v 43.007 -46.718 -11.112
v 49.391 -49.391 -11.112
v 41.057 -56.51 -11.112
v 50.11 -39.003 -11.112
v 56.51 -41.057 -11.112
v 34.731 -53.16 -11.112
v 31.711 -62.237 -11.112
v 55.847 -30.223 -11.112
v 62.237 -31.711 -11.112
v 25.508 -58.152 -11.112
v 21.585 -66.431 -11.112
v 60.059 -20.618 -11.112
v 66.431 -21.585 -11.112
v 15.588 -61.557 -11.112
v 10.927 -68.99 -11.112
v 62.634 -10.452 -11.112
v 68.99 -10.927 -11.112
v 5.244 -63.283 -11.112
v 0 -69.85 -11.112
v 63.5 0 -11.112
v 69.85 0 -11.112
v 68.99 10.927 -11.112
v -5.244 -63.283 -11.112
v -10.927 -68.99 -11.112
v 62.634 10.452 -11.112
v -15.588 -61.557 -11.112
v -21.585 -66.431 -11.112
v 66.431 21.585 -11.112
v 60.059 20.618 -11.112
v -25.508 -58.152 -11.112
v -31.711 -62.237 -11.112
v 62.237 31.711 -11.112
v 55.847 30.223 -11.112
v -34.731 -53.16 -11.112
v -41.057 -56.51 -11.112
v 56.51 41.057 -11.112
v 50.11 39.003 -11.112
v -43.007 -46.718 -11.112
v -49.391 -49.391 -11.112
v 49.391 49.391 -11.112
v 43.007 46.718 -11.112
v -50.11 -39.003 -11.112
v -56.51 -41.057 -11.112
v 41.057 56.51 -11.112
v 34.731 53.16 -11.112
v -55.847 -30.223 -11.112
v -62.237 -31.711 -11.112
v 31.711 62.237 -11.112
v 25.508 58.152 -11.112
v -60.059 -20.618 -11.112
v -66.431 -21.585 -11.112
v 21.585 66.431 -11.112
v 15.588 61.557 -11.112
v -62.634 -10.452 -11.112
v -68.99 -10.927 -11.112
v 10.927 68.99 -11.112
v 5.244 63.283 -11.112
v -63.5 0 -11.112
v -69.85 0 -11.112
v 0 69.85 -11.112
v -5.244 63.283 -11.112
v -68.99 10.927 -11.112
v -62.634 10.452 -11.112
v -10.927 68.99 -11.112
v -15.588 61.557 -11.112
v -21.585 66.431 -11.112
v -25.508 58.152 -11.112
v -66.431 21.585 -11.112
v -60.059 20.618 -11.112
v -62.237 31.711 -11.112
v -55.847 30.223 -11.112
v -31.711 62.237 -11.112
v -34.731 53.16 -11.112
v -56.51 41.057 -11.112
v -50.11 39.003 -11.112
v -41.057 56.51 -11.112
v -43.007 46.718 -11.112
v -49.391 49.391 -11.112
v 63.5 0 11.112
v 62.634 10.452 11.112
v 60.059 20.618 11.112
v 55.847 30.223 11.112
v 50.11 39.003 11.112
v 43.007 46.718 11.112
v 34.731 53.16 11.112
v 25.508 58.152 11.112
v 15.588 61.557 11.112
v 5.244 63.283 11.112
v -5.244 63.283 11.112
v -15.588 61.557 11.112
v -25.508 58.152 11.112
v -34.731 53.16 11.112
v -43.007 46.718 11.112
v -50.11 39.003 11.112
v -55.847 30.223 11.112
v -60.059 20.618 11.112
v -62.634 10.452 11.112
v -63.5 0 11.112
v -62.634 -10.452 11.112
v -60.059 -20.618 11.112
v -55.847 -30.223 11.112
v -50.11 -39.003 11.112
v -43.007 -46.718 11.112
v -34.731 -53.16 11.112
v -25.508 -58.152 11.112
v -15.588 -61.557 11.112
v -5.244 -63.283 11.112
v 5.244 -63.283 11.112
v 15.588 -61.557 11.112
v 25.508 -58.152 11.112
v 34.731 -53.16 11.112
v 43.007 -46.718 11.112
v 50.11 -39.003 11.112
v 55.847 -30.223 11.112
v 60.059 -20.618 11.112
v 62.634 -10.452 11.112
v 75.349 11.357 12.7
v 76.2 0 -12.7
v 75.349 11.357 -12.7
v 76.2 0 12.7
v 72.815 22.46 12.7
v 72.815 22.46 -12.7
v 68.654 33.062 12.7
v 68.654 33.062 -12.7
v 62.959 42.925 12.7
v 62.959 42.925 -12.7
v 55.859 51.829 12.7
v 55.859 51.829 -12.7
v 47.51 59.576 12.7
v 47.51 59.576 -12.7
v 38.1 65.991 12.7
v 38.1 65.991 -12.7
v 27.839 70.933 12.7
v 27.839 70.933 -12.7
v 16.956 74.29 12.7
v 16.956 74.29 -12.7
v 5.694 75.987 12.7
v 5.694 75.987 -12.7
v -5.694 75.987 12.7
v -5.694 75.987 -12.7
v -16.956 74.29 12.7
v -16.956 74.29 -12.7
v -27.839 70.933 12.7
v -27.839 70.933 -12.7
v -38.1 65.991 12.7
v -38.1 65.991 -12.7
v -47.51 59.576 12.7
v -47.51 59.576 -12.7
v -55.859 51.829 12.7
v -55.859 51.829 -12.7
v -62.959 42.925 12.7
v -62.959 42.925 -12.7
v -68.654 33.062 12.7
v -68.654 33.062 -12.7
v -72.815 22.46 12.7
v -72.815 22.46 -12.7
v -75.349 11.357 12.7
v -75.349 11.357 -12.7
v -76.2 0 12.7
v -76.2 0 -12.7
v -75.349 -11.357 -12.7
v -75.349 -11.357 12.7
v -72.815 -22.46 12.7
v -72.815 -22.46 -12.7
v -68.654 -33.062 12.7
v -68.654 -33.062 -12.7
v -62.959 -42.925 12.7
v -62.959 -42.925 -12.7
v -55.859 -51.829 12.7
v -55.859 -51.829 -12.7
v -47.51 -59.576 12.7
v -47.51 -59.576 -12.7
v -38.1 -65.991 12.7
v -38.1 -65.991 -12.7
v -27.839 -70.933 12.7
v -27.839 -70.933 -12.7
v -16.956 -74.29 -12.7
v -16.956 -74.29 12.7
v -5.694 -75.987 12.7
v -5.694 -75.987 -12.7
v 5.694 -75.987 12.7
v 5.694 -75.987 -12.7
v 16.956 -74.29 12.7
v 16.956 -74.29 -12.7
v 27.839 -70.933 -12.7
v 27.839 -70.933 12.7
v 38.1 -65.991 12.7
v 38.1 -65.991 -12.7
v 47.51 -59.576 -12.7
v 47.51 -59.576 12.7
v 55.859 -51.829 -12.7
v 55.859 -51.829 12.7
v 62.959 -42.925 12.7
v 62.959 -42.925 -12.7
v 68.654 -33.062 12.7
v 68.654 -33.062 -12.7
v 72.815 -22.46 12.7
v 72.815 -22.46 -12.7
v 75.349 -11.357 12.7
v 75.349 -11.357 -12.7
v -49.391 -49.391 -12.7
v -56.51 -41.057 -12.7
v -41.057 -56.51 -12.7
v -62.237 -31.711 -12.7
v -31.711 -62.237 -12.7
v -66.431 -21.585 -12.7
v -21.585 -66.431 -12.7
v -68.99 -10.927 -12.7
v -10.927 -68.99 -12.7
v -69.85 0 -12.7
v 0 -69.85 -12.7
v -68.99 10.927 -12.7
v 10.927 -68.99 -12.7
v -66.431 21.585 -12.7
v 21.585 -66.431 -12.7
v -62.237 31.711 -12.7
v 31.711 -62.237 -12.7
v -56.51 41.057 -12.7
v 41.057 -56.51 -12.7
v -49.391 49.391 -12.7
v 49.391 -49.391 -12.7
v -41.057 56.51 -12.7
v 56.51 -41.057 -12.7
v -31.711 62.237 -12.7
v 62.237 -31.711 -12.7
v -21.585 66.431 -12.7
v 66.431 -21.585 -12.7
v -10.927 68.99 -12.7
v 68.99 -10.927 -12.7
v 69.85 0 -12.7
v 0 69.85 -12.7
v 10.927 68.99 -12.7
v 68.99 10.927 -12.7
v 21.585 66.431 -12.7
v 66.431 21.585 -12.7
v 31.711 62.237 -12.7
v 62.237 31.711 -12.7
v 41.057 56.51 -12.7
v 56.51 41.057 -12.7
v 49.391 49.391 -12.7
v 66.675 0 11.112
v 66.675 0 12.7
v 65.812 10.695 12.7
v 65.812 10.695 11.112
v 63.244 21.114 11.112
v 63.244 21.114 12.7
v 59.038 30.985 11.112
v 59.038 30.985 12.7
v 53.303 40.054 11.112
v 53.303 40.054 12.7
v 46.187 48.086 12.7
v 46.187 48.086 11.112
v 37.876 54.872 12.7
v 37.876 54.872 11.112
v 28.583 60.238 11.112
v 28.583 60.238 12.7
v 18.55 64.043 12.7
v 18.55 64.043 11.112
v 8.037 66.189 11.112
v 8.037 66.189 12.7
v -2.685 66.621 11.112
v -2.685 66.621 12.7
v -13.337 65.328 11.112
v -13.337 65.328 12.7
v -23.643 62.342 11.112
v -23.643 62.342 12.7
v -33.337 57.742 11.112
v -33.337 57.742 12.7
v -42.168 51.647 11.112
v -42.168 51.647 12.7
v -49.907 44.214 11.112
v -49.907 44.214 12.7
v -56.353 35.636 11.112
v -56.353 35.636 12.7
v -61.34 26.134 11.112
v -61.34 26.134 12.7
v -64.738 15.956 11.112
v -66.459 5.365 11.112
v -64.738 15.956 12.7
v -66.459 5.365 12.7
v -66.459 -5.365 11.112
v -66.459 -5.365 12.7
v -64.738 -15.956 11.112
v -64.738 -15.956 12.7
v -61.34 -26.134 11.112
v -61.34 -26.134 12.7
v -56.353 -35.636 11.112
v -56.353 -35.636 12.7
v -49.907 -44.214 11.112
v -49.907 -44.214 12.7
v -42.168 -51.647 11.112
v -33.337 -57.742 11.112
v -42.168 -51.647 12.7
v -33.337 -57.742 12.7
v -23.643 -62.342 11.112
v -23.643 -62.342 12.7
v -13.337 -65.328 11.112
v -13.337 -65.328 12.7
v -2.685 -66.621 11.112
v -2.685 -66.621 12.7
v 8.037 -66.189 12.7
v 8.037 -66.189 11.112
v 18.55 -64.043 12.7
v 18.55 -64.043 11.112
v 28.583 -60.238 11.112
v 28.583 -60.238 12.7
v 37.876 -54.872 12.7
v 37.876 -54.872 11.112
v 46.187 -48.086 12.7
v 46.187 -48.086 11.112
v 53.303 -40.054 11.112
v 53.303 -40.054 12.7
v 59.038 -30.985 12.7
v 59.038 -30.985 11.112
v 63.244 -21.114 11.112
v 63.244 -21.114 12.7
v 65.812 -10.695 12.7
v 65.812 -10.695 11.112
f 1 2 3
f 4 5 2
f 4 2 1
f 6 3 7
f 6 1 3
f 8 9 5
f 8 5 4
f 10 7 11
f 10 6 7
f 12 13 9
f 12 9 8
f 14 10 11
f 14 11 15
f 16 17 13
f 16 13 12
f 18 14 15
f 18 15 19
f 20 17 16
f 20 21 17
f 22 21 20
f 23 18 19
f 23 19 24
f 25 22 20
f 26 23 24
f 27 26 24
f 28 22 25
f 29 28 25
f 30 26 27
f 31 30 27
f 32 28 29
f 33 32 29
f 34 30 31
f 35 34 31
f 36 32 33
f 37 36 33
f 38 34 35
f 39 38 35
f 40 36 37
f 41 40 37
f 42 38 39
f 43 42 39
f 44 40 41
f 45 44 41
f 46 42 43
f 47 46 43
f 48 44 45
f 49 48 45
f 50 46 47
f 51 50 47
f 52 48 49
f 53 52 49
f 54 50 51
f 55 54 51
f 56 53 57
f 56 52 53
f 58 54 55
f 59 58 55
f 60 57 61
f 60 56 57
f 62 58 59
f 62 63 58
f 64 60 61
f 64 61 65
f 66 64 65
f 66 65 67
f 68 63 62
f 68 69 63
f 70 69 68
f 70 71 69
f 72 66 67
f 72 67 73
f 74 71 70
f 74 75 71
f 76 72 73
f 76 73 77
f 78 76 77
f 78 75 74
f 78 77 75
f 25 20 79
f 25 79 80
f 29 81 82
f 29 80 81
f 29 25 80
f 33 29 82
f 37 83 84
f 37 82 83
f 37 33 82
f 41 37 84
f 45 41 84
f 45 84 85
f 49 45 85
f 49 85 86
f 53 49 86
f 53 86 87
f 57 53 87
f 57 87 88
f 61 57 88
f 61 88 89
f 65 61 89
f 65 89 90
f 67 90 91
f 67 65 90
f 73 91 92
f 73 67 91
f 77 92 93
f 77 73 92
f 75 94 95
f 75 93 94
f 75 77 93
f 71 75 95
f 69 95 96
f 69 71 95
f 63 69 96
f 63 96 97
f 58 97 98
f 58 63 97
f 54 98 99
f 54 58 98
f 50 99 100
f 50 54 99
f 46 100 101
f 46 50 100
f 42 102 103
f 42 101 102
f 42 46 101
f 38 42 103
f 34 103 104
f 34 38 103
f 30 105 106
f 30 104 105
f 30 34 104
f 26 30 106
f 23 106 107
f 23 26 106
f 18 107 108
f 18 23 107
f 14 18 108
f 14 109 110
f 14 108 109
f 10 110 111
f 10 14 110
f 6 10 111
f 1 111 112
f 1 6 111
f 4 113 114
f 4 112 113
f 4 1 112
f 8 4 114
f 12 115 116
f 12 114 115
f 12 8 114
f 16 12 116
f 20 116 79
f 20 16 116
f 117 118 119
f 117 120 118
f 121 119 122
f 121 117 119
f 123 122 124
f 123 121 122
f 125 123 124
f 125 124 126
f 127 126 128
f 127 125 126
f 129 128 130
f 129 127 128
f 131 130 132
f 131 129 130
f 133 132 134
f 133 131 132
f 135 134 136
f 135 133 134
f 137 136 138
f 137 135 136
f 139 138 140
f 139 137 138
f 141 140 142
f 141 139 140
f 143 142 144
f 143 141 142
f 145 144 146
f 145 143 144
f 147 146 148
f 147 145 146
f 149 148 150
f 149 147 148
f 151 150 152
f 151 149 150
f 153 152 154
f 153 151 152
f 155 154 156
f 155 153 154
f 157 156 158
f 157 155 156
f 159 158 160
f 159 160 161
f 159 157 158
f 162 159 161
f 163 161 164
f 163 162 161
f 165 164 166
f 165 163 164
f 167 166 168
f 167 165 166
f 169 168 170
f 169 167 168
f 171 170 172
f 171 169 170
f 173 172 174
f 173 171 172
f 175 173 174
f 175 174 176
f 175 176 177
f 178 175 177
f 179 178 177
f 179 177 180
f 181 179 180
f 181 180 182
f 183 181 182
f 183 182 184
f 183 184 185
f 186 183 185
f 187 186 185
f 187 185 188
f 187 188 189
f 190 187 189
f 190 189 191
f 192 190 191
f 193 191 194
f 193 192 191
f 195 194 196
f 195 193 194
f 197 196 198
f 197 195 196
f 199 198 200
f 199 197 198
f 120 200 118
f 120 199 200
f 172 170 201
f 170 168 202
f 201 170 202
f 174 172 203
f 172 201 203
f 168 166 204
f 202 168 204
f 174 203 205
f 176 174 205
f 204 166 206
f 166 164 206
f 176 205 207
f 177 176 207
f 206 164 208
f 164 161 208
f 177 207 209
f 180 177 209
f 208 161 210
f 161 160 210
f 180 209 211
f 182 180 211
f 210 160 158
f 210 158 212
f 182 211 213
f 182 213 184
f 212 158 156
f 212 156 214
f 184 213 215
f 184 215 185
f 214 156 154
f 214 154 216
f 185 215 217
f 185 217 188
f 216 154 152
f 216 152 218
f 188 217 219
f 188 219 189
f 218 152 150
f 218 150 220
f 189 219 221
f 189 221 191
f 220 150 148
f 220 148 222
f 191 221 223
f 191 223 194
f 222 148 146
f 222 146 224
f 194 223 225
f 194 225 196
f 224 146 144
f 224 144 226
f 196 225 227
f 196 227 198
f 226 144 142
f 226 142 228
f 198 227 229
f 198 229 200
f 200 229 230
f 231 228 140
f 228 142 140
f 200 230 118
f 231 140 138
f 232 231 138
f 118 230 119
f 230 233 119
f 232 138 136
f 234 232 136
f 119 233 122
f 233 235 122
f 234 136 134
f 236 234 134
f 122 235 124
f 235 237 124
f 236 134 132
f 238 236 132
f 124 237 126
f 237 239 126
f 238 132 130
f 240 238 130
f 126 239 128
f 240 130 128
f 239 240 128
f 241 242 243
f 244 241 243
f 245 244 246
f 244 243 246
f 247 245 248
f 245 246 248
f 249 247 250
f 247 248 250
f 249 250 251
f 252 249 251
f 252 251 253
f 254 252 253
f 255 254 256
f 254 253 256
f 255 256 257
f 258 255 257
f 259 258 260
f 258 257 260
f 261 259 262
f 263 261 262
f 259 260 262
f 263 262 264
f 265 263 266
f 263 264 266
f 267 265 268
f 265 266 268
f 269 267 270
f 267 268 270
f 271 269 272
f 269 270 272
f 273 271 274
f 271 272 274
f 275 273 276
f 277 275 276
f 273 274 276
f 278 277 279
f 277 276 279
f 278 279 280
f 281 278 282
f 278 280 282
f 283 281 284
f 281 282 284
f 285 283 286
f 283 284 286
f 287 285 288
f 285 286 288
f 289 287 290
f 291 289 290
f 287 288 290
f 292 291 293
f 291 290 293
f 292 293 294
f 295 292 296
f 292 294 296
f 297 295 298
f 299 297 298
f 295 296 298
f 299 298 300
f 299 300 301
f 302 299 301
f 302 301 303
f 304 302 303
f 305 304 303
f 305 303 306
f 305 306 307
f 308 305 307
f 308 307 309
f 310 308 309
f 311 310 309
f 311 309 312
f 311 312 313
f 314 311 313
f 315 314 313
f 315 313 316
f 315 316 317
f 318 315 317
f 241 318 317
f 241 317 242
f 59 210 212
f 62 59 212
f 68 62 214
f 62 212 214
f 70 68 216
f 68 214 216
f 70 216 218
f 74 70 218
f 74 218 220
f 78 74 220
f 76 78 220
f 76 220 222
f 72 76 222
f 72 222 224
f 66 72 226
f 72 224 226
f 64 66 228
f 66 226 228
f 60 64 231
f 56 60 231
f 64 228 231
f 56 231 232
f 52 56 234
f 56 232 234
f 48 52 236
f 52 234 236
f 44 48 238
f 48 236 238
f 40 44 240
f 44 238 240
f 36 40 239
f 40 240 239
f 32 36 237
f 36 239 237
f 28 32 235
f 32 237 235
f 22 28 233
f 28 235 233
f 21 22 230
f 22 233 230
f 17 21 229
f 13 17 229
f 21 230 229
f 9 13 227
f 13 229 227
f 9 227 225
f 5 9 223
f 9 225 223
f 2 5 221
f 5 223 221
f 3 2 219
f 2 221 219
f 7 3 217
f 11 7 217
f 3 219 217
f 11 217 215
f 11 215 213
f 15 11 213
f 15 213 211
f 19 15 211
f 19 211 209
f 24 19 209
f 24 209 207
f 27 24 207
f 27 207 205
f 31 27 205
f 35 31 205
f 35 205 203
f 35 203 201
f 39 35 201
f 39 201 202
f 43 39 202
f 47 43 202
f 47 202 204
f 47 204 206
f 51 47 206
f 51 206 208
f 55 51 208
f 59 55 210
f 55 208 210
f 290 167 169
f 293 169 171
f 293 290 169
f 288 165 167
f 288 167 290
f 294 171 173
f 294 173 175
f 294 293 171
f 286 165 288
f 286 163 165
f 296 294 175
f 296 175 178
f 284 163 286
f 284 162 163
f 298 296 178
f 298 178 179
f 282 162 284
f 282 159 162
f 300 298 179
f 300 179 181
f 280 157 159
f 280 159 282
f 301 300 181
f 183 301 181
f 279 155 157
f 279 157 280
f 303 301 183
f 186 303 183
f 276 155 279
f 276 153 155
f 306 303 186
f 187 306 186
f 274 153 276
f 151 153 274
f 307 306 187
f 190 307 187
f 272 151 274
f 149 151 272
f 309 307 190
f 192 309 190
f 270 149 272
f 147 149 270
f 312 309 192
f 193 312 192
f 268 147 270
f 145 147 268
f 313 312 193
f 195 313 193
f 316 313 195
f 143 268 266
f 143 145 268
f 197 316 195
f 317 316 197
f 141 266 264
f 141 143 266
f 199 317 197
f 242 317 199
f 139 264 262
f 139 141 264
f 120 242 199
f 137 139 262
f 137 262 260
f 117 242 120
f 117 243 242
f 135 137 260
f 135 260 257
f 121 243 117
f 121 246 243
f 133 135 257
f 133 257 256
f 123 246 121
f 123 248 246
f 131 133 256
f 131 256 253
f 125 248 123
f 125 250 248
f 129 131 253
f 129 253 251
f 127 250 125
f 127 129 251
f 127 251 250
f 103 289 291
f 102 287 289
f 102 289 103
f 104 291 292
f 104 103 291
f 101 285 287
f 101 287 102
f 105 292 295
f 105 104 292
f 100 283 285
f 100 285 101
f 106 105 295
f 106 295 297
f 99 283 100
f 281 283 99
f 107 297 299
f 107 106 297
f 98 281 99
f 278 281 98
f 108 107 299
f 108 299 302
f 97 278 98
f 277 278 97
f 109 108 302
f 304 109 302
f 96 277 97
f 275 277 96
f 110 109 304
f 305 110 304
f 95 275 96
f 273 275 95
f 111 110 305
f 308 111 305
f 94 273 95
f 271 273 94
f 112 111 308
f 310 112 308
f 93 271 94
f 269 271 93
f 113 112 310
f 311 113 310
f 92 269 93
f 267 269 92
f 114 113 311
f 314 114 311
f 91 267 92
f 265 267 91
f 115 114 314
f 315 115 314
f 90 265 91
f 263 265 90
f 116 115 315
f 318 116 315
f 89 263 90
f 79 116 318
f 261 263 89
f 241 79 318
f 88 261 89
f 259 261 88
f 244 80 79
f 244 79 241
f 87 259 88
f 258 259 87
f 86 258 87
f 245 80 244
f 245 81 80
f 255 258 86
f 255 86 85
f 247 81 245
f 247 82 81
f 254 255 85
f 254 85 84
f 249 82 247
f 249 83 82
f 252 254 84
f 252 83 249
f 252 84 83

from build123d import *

# Parameters (mm, degrees)
SKETCH1_R           = 76.2
SKETCH1_R_2         = 63.5
BOSS_EXTRUDE1_DEPTH = 12.7
SKETCH2_R           = 66.675
CUT_EXTRUDE1_DEPTH  = 1.5875
SKETCH3_R           = 69.85
CUT_EXTRUDE2_DEPTH  = 1.5875


with BuildPart() as part:
    # Sketch1 → Boss-Extrude1 (new, symmetric)
    with BuildSketch(Plane.XY):
        Circle(SKETCH1_R)
        Circle(SKETCH1_R_2, mode=Mode.SUBTRACT)
    extrude(amount=BOSS_EXTRUDE1_DEPTH, both=True)

    # Sketch2 → Cut-Extrude1 (cut)
    with BuildSketch(Plane.XY.offset(12.7)):
        Circle(SKETCH2_R)
    extrude(amount=-CUT_EXTRUDE1_DEPTH, mode=Mode.SUBTRACT)

    # Sketch3 → Cut-Extrude2 (cut)
    with BuildSketch(Plane(origin=(0, 0, -12.7), x_dir=(-1, 0, 0), z_dir=(0, 0, -1))):
        Circle(SKETCH3_R)
    extrude(amount=-CUT_EXTRUDE2_DEPTH, mode=Mode.SUBTRACT)


solid = part.part
